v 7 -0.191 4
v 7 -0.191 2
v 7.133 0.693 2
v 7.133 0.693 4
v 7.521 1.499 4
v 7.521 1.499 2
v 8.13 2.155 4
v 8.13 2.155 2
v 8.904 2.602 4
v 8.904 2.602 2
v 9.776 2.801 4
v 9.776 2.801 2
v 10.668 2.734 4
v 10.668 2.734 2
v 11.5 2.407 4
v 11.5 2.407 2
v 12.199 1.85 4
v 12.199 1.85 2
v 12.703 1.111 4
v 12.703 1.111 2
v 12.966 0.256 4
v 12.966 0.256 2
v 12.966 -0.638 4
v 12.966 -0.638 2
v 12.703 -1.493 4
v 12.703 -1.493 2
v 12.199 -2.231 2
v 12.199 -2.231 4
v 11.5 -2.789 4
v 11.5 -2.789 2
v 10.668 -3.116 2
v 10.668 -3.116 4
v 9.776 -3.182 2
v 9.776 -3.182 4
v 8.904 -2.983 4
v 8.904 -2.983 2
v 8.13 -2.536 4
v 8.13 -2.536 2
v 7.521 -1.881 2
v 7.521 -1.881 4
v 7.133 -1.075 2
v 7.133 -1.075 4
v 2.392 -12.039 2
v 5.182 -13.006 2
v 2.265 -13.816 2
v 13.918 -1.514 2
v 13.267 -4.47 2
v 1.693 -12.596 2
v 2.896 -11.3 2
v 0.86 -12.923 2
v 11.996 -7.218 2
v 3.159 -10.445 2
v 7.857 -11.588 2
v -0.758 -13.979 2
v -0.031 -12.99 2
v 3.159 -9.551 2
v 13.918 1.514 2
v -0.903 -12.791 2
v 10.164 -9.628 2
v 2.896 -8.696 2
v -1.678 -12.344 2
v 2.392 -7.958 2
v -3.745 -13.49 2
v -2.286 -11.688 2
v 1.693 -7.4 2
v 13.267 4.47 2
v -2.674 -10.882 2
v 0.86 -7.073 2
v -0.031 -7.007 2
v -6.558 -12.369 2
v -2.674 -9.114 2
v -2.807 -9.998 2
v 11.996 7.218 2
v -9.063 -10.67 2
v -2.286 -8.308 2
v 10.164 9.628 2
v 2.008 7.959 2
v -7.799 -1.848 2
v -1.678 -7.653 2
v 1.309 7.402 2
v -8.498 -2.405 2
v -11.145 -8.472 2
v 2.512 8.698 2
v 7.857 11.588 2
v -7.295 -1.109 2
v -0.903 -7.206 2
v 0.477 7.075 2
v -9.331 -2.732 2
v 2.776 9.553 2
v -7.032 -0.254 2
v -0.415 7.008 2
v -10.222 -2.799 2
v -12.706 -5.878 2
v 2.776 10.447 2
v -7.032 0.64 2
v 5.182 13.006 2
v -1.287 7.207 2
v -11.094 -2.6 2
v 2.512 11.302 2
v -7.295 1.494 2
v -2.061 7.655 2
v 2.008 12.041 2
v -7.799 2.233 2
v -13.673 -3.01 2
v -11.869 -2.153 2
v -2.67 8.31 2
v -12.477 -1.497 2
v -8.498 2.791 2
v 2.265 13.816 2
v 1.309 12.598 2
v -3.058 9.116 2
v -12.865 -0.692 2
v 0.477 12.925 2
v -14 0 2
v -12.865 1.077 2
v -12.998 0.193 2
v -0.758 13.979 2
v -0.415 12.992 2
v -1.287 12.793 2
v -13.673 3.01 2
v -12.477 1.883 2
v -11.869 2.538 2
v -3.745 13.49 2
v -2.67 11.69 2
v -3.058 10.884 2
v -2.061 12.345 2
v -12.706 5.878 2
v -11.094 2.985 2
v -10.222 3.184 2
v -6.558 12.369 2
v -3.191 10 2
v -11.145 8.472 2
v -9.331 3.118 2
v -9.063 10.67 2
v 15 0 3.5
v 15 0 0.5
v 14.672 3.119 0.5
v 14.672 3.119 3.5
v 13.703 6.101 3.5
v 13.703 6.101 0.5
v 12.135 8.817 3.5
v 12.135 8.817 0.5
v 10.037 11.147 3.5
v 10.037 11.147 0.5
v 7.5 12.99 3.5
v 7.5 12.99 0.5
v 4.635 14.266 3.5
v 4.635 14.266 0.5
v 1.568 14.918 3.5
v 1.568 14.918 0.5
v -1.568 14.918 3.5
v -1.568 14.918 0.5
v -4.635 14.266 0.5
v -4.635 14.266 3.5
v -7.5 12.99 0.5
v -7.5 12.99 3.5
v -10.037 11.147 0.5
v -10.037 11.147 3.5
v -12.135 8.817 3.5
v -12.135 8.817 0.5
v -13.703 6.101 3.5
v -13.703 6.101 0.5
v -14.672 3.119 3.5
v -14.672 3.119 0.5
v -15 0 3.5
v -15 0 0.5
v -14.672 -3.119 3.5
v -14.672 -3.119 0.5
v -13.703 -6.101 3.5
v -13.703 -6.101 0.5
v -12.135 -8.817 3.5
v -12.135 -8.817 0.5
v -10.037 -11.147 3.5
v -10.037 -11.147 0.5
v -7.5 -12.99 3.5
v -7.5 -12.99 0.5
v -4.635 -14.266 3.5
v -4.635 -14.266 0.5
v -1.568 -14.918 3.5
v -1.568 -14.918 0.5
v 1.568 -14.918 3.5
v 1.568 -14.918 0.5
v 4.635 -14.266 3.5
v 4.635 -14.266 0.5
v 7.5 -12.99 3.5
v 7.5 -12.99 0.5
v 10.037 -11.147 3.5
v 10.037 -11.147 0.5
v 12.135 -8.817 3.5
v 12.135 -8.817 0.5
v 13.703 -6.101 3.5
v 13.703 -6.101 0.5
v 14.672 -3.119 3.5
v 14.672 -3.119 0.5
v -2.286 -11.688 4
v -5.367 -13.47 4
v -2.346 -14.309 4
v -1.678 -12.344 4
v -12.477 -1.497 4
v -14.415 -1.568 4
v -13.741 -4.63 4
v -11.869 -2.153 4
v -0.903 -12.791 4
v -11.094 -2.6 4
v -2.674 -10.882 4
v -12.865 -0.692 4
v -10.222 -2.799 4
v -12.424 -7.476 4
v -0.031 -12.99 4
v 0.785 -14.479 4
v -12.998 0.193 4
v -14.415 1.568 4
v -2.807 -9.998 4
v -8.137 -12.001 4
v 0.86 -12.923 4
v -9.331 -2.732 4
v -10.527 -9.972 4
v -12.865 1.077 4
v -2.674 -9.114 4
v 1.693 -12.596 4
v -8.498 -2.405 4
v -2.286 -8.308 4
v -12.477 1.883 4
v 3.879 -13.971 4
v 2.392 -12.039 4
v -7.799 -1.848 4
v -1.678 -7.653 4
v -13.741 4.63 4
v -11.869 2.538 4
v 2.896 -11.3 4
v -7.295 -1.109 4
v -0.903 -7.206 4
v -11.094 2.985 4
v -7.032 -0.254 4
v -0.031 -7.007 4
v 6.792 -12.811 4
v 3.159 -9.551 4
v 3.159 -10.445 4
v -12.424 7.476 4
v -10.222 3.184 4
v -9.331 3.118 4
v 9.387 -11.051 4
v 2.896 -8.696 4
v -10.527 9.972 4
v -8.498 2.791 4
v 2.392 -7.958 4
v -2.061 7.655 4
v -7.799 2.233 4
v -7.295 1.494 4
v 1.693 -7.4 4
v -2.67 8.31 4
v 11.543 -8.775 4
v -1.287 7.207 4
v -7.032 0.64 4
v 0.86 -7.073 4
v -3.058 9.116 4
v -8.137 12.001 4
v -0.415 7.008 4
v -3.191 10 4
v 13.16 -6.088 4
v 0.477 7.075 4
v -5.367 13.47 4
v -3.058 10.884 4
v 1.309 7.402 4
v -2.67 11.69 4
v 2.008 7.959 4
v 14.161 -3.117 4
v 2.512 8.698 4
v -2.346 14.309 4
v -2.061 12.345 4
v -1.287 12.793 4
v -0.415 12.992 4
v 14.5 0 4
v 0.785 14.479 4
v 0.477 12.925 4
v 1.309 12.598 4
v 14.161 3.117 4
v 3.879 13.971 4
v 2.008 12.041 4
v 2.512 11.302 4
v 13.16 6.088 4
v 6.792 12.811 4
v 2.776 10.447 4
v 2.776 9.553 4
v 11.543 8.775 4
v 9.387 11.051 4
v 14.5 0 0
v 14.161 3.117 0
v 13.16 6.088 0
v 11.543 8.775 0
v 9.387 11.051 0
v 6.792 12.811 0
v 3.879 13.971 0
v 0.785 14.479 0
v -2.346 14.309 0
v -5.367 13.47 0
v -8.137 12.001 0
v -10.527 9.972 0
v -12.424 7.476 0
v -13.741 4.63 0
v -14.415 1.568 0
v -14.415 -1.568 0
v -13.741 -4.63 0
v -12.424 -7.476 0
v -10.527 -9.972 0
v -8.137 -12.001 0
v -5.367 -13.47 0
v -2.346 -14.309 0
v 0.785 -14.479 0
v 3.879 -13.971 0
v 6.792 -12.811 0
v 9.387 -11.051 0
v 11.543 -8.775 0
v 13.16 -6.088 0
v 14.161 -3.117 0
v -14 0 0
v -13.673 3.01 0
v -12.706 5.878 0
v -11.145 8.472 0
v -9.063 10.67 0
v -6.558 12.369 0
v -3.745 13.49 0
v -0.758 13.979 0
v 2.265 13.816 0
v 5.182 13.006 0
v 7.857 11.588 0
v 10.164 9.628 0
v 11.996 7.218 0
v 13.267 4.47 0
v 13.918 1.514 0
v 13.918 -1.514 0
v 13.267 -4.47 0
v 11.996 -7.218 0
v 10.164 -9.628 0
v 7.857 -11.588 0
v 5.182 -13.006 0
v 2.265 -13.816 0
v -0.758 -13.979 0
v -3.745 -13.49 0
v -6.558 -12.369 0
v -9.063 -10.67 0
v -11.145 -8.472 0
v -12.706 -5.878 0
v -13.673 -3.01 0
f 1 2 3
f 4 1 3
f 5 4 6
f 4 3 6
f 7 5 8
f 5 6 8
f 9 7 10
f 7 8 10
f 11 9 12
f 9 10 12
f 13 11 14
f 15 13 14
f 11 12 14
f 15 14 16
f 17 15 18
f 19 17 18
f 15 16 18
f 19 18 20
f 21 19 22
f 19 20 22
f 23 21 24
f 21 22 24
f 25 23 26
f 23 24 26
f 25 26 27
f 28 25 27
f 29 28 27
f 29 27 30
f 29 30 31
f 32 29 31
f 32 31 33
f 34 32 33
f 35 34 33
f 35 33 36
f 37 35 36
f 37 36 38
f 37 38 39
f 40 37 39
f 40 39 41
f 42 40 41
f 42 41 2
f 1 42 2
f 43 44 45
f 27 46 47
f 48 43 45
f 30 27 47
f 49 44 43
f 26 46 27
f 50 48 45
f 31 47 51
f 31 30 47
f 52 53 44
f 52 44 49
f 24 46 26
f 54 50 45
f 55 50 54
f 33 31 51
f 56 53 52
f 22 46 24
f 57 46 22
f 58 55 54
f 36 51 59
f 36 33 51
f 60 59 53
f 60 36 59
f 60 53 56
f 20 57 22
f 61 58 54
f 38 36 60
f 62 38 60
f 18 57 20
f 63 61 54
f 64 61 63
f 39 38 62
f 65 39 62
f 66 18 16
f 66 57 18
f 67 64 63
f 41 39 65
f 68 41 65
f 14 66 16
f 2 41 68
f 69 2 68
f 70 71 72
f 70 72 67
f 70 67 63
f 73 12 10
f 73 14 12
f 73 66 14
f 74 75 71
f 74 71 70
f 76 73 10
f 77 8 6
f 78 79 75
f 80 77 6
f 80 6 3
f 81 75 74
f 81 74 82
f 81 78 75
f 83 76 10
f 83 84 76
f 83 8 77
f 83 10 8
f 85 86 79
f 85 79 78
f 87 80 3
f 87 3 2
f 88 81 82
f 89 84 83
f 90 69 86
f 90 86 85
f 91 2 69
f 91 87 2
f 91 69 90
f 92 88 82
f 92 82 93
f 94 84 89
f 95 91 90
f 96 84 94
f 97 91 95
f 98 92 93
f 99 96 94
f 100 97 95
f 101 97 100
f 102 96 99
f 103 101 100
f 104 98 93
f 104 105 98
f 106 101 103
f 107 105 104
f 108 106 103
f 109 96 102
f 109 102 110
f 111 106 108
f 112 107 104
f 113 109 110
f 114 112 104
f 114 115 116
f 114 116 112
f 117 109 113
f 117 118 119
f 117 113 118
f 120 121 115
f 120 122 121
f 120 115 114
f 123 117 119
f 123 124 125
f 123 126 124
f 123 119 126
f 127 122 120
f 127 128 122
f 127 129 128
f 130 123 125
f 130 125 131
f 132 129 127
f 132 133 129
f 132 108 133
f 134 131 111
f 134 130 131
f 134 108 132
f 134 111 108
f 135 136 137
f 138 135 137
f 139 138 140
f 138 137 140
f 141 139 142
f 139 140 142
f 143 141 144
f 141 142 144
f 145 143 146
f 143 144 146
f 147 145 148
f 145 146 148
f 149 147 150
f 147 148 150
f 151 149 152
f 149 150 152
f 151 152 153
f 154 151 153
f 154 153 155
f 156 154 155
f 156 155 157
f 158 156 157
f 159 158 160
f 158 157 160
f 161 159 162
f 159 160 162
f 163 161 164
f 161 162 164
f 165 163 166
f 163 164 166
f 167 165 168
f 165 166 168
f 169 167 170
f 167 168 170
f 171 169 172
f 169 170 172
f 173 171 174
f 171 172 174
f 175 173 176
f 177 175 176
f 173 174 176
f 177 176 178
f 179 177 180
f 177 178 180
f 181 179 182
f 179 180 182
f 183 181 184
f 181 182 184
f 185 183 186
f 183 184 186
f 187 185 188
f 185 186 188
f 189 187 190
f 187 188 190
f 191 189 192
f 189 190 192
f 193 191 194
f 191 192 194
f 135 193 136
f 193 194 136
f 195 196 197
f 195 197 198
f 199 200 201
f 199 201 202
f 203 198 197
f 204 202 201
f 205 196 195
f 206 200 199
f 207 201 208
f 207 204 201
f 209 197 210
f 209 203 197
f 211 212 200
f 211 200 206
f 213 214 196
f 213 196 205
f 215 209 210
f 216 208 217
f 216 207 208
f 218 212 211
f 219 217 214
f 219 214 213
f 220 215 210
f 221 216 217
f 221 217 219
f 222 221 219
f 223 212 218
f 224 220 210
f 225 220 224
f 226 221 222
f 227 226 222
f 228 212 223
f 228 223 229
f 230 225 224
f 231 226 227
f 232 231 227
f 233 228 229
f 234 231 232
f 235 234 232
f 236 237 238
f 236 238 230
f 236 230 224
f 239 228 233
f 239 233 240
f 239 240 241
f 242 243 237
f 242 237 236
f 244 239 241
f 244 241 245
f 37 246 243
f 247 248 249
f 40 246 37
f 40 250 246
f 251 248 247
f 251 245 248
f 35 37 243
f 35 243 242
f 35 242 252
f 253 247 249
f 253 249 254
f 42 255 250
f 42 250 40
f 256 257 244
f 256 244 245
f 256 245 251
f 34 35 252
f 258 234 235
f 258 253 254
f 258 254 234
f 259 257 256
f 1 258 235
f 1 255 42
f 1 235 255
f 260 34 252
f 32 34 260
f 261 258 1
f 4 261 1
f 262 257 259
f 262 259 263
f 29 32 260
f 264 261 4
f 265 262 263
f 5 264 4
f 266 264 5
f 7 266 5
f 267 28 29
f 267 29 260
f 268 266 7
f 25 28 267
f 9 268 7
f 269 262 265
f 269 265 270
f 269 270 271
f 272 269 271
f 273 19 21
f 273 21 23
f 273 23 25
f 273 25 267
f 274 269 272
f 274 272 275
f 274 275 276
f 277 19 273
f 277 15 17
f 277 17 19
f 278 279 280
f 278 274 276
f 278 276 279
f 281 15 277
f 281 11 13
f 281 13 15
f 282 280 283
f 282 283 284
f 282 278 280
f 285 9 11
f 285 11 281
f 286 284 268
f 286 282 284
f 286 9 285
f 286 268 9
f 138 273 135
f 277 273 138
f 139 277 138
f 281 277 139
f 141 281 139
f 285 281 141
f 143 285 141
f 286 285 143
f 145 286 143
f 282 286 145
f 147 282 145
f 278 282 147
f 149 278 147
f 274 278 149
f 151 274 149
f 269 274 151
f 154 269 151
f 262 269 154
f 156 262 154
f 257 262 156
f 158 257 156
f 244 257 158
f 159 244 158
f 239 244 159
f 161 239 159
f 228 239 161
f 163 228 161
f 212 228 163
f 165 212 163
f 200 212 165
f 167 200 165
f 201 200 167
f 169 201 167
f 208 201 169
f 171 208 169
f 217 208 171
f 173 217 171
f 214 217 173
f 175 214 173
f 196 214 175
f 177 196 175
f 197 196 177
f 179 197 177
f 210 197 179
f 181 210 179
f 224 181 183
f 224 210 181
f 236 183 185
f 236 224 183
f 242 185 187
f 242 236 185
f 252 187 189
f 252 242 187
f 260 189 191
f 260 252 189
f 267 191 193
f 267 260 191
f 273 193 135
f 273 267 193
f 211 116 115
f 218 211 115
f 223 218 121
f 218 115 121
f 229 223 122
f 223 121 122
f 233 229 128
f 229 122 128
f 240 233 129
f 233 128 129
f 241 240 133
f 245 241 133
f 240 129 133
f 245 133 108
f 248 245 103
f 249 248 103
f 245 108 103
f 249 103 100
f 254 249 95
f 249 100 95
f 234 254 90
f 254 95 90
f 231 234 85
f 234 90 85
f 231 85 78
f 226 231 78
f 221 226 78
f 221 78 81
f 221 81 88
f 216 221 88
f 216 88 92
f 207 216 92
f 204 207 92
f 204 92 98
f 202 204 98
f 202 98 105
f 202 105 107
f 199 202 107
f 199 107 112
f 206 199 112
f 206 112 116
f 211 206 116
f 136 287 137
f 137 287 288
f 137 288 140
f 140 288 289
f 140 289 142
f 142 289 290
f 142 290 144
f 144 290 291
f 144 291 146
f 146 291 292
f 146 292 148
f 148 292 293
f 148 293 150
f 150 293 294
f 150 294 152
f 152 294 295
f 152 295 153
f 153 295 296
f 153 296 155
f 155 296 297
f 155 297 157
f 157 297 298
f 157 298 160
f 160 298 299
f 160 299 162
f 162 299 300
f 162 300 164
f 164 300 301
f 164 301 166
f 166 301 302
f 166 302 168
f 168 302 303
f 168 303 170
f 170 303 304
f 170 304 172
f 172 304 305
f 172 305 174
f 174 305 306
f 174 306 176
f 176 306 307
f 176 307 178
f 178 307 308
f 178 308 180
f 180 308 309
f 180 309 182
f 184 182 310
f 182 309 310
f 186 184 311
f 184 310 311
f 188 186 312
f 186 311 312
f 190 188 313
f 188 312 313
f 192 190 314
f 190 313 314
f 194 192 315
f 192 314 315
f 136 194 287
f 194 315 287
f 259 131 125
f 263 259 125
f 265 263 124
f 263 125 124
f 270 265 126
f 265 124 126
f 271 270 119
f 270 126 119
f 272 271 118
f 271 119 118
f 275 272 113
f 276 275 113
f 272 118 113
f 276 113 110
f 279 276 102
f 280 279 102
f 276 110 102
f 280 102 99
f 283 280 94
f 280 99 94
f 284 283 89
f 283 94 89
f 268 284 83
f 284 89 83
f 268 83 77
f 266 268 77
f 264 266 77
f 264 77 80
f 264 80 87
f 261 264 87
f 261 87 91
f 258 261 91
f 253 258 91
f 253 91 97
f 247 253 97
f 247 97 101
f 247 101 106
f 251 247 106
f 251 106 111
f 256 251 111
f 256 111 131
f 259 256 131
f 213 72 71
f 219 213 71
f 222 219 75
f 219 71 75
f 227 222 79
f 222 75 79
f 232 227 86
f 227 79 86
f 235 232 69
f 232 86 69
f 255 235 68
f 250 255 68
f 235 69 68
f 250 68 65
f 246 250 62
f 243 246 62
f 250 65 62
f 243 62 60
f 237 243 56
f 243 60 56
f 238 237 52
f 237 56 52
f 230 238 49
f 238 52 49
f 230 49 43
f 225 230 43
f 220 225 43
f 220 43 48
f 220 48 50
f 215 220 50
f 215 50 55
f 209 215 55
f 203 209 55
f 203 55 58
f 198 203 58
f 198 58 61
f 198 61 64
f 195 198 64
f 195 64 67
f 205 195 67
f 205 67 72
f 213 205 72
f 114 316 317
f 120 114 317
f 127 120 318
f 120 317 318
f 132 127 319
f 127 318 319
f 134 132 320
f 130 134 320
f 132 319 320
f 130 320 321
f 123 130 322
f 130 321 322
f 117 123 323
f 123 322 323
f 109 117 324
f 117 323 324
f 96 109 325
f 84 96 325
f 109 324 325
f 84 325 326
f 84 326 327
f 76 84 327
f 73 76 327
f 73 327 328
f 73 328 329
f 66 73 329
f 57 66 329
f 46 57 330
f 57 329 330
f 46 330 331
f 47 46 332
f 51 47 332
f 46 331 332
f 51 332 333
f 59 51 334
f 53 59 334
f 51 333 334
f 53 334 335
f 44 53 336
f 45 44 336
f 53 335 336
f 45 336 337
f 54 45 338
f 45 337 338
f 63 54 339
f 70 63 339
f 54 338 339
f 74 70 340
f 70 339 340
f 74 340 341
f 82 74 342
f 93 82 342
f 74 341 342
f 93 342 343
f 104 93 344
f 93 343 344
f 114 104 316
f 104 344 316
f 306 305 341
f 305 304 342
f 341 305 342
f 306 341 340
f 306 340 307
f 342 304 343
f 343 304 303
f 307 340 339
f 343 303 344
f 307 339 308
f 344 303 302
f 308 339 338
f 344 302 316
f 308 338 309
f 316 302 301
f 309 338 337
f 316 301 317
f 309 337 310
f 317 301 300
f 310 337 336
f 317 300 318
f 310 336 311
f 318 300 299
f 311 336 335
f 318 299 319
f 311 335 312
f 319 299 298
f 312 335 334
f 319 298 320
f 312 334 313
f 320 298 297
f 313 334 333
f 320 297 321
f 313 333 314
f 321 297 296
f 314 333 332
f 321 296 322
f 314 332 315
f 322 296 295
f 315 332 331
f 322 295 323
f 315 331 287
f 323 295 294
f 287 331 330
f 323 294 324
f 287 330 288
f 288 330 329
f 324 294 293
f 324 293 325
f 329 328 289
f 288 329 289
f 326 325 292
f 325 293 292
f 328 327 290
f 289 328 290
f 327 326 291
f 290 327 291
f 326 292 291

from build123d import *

# Parameters (mm, degrees)
SKETCH_1_R          = 15
EXTRUDE_1_DEPTH     = 4
SKETCH_3_R          = 14
CUT_EXTRUDE_2_DEPTH = 2
SKETCH_5_R          = 3
CUT_EXTRUDE_3_DEPTH = 3
CHAMFER_1_SIZE      = 0.5
CHAMFER_3_SIZE      = 0.5


with BuildPart() as part:
    # Эскиз1 → Вытянуть1 (new body)
    with BuildSketch(Plane.XY):
        Circle(SKETCH_1_R)
    extrude(amount=EXTRUDE_1_DEPTH)

    # Эскиз3 → Вытянуть2 (cut)
    with BuildSketch(Plane(origin=(0, 0, 0), x_dir=(-1, 0, 0), z_dir=(0, 0, -1))):
        Circle(SKETCH_3_R)
    extrude(amount=-CUT_EXTRUDE_2_DEPTH, mode=Mode.SUBTRACT)

    # Эскиз5 → Вытянуть3 (cut, through all)
    with BuildSketch(Plane(origin=(0, 0, 2), x_dir=(-1, 0, 0), z_dir=(0, 0, -1))):
        with Locations((9.998142701, 0.192724)):
            Circle(SKETCH_5_R)
        with Locations((-0.192724, -9.998142701)):
            Circle(SKETCH_5_R)
        with Locations((0.1908667, 10)):
            Circle(SKETCH_5_R)
        with Locations((-10, -0.1908667)):
            Circle(SKETCH_5_R)
    extrude(amount=-CUT_EXTRUDE_3_DEPTH, mode=Mode.SUBTRACT)

    # Фаска1
    chamfer_1_edges = [part.edges().sort_by_distance(p)[0] for p in [
        (-15, 0, 4),
    ]]
    chamfer(chamfer_1_edges, length=CHAMFER_1_SIZE)

    # Фаска3
    chamfer_3_edges = [part.edges().sort_by_distance(p)[0] for p in [
        (-15, 0, 0),
    ]]
    chamfer(chamfer_3_edges, length=CHAMFER_3_SIZE)


solid = part.part
